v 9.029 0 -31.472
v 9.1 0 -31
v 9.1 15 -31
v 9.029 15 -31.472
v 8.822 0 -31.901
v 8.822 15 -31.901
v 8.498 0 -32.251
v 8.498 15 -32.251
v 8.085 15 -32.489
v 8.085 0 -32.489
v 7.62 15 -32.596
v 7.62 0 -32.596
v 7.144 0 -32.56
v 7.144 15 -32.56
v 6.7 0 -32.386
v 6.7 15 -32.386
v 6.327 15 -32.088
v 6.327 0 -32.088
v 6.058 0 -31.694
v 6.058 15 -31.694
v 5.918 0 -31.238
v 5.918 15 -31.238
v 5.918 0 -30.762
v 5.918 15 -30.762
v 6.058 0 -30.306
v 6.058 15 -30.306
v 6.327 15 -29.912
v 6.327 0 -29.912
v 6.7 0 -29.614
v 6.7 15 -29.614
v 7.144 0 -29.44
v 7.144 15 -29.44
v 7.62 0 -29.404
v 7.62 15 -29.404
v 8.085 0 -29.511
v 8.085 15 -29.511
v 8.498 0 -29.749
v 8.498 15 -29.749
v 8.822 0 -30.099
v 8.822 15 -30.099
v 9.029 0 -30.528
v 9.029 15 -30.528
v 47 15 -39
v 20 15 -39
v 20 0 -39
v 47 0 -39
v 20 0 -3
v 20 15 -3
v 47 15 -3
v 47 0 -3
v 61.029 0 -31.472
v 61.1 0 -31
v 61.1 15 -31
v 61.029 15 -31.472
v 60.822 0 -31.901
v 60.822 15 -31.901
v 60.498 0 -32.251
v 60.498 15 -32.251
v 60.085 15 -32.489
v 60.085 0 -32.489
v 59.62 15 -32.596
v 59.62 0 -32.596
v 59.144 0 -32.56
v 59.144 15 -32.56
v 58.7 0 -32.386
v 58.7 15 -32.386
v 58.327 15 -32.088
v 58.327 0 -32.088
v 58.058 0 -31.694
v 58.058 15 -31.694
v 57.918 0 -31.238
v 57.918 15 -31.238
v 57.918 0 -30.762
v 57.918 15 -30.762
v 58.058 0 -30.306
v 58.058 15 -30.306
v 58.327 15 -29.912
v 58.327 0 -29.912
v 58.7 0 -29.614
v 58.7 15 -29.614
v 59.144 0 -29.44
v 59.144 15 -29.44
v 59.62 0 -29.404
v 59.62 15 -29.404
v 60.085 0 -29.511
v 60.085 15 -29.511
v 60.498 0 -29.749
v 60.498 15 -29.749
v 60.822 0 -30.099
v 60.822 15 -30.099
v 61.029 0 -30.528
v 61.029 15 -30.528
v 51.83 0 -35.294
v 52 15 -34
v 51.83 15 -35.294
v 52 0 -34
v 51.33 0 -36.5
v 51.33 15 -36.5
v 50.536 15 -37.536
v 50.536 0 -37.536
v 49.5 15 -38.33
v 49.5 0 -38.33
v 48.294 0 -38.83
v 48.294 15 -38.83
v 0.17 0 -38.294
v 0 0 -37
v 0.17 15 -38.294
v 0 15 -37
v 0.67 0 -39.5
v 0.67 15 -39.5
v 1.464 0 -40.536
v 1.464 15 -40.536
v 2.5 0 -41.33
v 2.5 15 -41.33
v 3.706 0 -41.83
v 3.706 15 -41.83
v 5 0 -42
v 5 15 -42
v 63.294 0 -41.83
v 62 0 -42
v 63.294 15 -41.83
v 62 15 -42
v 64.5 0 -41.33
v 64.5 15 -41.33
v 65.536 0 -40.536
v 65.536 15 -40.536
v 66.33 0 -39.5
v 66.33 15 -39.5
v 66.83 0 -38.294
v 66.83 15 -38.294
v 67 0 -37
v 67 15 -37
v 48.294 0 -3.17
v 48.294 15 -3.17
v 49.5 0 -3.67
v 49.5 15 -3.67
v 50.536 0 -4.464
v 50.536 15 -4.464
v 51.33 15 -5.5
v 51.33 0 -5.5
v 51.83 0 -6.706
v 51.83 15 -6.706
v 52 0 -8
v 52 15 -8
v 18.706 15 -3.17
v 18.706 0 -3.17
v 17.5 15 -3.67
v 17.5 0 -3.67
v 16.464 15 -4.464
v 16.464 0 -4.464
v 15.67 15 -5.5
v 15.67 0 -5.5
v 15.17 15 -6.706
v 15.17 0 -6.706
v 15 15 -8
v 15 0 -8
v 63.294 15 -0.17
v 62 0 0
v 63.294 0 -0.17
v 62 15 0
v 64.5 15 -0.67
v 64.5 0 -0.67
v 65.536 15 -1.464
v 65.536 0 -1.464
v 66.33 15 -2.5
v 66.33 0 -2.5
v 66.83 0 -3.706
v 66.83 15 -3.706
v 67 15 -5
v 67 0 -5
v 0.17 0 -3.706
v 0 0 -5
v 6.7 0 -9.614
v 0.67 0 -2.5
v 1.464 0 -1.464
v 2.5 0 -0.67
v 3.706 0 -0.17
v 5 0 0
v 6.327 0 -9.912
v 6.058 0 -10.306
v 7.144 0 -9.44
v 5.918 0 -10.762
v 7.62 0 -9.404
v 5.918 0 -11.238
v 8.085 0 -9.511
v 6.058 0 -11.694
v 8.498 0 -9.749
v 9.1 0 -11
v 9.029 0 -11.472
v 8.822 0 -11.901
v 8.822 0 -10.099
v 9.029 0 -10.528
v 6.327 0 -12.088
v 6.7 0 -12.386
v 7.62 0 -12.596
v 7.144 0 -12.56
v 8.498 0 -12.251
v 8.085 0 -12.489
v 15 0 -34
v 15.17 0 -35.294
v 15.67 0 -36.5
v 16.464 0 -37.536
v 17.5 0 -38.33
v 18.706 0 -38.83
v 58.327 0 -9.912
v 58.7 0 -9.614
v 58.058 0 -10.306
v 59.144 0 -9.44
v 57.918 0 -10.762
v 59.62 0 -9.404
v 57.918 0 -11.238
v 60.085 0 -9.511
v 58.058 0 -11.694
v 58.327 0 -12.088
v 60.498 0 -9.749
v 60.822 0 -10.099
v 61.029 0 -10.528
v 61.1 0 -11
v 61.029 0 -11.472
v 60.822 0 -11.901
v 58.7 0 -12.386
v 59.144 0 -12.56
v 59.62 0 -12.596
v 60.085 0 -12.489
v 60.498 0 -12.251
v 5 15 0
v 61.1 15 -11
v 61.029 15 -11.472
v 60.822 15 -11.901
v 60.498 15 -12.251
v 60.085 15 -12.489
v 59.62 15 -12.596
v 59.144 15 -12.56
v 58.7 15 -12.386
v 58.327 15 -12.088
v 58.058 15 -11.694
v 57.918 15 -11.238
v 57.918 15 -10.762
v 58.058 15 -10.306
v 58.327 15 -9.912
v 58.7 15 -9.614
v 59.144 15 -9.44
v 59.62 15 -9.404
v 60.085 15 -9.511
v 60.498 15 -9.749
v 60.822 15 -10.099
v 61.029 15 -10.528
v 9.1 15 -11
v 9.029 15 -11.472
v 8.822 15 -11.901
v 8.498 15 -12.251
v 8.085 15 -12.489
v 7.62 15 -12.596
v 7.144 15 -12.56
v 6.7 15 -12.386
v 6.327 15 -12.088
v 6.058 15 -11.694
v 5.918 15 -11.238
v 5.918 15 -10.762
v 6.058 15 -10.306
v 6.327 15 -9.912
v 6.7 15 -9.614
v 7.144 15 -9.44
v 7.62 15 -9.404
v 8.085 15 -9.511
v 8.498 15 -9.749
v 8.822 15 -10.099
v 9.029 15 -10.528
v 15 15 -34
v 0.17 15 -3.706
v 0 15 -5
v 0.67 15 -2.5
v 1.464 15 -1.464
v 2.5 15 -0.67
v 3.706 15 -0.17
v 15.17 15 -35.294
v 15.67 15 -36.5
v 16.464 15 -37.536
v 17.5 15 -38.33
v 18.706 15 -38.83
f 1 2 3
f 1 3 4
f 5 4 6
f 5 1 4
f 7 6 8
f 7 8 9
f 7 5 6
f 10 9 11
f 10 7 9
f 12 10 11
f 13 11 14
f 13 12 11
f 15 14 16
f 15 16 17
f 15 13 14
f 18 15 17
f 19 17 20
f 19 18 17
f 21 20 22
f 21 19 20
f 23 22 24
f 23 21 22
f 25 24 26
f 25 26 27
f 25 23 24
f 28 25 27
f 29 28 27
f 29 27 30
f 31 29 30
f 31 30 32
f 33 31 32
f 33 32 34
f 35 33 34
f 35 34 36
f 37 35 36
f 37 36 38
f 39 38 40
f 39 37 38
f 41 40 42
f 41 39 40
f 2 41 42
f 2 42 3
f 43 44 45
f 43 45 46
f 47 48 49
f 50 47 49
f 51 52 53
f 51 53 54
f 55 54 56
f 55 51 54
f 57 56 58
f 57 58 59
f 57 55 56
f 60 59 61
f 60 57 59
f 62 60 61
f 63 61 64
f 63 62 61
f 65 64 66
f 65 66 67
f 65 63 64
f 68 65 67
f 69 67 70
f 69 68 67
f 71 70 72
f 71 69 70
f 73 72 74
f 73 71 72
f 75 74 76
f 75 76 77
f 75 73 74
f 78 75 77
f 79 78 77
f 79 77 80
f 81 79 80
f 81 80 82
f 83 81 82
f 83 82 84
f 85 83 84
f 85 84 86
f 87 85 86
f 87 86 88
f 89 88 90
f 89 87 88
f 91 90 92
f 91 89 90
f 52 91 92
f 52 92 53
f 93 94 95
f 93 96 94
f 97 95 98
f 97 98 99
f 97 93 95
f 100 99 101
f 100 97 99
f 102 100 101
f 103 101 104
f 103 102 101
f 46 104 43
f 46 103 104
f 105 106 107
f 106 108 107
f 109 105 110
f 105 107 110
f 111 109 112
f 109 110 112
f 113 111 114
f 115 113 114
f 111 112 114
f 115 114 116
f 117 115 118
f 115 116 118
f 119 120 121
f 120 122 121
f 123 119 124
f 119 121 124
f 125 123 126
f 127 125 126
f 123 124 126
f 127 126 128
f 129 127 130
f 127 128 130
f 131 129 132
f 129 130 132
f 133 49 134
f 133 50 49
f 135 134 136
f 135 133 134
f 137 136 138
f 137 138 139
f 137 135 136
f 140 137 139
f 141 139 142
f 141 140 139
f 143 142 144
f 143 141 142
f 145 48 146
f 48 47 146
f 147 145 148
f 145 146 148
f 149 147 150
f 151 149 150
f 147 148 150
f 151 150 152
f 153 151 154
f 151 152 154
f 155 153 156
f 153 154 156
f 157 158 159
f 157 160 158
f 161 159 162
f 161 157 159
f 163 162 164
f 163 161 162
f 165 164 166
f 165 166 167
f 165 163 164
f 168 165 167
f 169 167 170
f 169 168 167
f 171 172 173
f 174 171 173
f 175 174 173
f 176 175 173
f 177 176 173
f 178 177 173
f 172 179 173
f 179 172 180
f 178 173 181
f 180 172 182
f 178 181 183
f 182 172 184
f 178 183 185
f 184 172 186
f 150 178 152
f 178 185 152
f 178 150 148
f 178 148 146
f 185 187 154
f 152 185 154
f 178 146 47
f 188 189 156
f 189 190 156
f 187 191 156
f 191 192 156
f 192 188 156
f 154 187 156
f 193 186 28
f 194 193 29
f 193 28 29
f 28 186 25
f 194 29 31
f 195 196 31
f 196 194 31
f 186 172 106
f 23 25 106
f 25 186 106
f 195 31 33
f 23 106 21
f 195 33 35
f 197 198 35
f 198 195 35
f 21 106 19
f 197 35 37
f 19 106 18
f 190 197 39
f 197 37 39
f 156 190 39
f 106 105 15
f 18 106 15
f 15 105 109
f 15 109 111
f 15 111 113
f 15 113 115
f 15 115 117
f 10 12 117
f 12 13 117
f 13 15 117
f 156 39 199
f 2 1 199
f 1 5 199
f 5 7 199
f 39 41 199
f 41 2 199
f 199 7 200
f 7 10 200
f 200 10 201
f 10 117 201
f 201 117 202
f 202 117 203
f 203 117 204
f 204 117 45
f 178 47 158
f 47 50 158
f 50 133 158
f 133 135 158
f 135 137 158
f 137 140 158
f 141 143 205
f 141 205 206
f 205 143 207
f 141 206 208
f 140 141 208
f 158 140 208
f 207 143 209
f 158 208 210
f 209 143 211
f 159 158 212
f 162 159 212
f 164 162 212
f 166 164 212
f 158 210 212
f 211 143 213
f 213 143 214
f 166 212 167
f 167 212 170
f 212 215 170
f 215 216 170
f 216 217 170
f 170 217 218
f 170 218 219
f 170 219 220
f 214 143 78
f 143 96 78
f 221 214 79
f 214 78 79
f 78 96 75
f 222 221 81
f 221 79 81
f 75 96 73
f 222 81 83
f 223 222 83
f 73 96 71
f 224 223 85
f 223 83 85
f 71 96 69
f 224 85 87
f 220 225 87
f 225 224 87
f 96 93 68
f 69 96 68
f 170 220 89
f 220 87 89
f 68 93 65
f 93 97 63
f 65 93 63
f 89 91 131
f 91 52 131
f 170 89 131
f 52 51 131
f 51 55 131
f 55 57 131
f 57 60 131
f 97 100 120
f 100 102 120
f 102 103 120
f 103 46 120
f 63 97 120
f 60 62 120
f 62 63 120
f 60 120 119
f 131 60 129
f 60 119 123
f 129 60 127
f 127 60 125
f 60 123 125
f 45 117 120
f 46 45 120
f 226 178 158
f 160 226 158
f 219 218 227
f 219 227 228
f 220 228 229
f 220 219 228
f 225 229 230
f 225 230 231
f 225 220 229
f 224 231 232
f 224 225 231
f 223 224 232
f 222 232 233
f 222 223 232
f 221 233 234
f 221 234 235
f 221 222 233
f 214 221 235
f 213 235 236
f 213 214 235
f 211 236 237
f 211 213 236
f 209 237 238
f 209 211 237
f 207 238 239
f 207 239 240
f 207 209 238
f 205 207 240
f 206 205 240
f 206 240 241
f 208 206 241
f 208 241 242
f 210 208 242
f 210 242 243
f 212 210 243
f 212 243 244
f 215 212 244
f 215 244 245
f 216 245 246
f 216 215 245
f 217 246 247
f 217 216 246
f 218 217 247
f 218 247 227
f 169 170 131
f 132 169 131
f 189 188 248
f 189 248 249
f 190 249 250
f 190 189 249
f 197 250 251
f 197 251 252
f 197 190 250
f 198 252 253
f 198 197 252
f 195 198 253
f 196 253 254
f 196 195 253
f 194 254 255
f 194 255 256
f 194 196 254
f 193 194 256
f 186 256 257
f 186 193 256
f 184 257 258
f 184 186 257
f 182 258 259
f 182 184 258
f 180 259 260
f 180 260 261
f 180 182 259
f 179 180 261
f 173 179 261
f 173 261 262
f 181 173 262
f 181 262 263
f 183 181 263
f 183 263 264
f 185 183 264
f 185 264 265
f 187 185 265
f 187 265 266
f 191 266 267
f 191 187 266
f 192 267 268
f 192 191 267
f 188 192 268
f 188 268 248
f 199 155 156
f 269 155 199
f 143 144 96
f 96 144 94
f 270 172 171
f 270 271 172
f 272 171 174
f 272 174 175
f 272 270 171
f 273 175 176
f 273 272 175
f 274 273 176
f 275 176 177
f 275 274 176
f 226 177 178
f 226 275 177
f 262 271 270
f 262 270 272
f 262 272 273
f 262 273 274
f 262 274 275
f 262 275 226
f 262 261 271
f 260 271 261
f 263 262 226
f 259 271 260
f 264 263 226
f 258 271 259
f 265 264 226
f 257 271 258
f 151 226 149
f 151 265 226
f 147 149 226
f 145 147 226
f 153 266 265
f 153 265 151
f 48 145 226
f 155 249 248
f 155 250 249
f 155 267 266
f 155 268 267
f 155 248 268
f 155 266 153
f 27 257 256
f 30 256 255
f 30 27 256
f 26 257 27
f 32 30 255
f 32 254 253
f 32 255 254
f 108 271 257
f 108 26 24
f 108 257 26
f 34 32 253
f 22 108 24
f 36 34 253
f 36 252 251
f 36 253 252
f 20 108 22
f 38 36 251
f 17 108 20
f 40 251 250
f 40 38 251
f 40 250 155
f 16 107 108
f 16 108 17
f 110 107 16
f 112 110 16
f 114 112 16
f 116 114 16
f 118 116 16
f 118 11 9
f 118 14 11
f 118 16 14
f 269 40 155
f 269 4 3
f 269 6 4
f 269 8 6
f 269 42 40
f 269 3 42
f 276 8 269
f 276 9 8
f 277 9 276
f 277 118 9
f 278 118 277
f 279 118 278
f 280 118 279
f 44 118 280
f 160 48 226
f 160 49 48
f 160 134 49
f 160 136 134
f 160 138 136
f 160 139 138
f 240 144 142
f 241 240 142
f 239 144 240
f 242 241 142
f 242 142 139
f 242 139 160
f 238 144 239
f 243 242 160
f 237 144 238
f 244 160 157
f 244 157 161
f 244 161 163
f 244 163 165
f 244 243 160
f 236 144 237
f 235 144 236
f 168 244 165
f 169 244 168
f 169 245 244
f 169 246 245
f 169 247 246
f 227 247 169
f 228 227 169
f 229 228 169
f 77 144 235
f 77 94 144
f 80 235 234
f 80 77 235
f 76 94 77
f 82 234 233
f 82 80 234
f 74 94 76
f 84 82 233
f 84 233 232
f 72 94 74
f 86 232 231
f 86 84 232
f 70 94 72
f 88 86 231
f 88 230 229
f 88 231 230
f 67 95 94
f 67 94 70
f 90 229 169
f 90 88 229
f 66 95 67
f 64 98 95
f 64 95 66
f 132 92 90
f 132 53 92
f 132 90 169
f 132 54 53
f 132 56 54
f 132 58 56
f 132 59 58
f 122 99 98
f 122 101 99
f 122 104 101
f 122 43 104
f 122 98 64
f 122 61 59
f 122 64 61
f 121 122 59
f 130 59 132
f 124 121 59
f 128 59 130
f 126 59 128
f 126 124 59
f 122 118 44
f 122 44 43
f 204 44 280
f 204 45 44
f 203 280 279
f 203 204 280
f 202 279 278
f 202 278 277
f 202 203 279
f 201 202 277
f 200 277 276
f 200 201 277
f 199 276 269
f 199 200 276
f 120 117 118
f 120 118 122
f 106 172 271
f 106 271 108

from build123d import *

# Parameters (mm, degrees)
SKETCH1_W           = 67
SKETCH1_H           = 42
SKETCH1_R           = 1.6
BOSS_EXTRUDE1_DEPTH = 15
SKETCH2_W           = 37
SKETCH2_H           = 36
CUT_EXTRUDE1_DEPTH  = 16
FILLET1_R           = 5


with BuildPart() as part:
    # Sketch1 → Boss-Extrude1 (new body)
    with BuildSketch(Plane(origin=(0, 0, 0), x_dir=(1, 0, 0), z_dir=(0, 1, 0))):
        with Locations((33.5, 21)):
            Rectangle(SKETCH1_W, SKETCH1_H)
        with Locations((7.5, 31)):
            Circle(SKETCH1_R, mode=Mode.SUBTRACT)
        with Locations((7.5, 11)):
            Circle(SKETCH1_R, mode=Mode.SUBTRACT)
        with Locations((59.5, 11)):
            Circle(SKETCH1_R, mode=Mode.SUBTRACT)
        with Locations((59.5, 31)):
            Circle(SKETCH1_R, mode=Mode.SUBTRACT)
    extrude(amount=BOSS_EXTRUDE1_DEPTH)

    # Sketch2 → Cut-Extrude1 (cut, through all)
    with BuildSketch(Plane(origin=(0, 15, 0), x_dir=(1, 0, 0), z_dir=(0, 1, 0))):
        with Locations((33.5, 21)):
            Rectangle(SKETCH2_W, SKETCH2_H)
    extrude(amount=-CUT_EXTRUDE1_DEPTH, mode=Mode.SUBTRACT)

    # Fillet1
    fillet1_edges = [part.edges().sort_by_distance(p)[0] for p in [
        (52, 7.5, -39),
        (52, 7.5, -3),
        (15, 7.5, -3),
        (15, 7.5, -39),
        (0, 7.5, -42),
        (67, 7.5, -42),
        (67, 7.5, 0),
        (0, 7.5, 0),
    ]]
    fillet(fillet1_edges, radius=FILLET1_R)


solid = part.part
